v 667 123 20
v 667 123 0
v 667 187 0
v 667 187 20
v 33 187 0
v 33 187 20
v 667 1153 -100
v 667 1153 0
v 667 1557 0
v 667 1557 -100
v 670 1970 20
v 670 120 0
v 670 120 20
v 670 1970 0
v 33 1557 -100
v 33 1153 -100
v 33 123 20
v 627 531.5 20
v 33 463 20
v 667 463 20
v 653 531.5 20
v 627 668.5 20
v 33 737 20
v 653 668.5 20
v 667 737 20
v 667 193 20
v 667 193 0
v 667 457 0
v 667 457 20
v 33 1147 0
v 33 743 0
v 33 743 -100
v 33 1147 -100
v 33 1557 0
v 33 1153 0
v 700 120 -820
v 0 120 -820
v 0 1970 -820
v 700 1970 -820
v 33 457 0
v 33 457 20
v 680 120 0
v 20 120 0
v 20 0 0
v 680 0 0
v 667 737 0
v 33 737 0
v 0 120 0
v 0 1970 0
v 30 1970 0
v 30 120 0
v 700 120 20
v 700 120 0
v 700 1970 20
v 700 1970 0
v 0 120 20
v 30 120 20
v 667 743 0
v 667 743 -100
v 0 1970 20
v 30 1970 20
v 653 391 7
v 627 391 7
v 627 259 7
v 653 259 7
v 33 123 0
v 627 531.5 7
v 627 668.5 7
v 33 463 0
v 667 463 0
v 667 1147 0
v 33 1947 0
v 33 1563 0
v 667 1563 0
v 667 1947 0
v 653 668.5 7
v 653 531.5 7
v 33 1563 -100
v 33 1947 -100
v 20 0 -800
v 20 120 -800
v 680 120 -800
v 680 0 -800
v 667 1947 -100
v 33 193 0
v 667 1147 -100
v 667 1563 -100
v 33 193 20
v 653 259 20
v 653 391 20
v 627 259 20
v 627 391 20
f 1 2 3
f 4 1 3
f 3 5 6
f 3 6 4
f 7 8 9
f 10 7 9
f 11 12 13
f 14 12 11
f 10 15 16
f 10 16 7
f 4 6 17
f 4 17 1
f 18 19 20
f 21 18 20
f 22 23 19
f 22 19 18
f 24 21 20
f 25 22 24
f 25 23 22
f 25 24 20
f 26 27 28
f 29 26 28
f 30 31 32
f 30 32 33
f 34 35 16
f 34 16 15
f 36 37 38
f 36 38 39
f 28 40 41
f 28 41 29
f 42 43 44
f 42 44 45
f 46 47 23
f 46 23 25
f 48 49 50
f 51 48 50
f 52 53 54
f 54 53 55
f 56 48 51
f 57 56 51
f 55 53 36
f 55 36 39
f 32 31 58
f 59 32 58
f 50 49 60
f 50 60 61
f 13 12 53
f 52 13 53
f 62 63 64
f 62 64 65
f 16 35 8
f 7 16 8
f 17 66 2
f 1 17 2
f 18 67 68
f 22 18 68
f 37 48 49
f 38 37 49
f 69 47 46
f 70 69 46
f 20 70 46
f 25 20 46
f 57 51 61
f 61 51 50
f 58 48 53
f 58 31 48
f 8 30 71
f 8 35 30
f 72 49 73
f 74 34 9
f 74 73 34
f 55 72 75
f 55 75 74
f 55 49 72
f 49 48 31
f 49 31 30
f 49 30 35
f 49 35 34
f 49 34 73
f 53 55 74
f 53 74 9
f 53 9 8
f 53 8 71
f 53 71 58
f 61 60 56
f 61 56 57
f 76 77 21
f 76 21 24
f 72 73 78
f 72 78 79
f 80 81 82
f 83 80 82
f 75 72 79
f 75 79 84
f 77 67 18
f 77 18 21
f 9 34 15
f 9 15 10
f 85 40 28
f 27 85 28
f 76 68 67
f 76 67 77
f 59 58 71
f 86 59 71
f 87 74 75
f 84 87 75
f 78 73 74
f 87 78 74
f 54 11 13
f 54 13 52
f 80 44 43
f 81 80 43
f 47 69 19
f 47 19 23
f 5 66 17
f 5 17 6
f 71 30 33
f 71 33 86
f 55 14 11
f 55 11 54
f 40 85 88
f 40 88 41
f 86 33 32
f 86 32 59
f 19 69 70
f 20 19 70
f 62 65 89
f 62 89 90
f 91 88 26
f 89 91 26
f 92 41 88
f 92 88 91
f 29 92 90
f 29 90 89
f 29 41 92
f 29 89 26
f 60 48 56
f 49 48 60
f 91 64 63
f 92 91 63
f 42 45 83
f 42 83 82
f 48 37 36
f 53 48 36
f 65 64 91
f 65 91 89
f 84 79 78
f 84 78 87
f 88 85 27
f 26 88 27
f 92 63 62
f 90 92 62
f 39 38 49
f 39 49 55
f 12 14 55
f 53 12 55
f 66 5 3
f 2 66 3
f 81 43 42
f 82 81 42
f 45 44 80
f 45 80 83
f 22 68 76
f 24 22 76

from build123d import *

# Parameters (mm, degrees)
SKETCH1_W              = 700
SKETCH1_H              = 1850
GOVDE_KASA_DEPTH       = 820
SKETCH2_W              = 660
SKETCH2_H              = 120
PLINT_DEPTH            = 800
SKETCH3_W              = 30
SKETCH3_H              = 1850
SOVE_SOL_DEPTH         = 20
SKETCH4_W              = 30
SKETCH4_H              = 1850
SOVE_SAG_DEPTH         = 20
SKETCH5_W              = 634
SKETCH5_H              = 384
ACIKLIK_KAT1_DEPTH     = 100
SKETCH6_W              = 634
SKETCH6_H              = 404
ACIKLIK_KAT2_DEPTH     = 100
SKETCH7_W              = 634
SKETCH7_H              = 404
ACIKLIK_KAT3_DEPTH     = 100
SKETCH8_W              = 634
SKETCH8_H              = 274
KLAPE_ALT_1_DEPTH      = 20
KLAPE_ALT_1_KULP_START = 7
SKETCH9_W              = 26
SKETCH9_H              = 137
KLAPE_ALT_1_KULP_DEPTH = 13
SKETCH10_W             = 634
SKETCH10_H             = 264
KLAPE_ALT_2_DEPTH      = 20
KLAPE_ALT_2_KULP_START = 7
SKETCH11_W             = 26
SKETCH11_H             = 132
KLAPE_ALT_2_KULP_DEPTH = 13
SKETCH12_W             = 634
SKETCH12_H             = 64
PANEL_ALT_DEPTH        = 20


with BuildPart() as part:
    # Sketch1 → govde_kasa (new body)
    with BuildSketch(Plane.XY):
        with Locations((350, 1045)):
            Rectangle(SKETCH1_W, SKETCH1_H)
    extrude(amount=-GOVDE_KASA_DEPTH)

    # Sketch5 → aciklik_kat1 (cut)
    with BuildSketch(Plane.XY):
        with Locations((350, 1755)):
            Rectangle(SKETCH5_W, SKETCH5_H)
    extrude(amount=-ACIKLIK_KAT1_DEPTH, mode=Mode.SUBTRACT)

    # Sketch6 → aciklik_kat2 (cut)
    with BuildSketch(Plane.XY):
        with Locations((350, 1355)):
            Rectangle(SKETCH6_W, SKETCH6_H)
    extrude(amount=-ACIKLIK_KAT2_DEPTH, mode=Mode.SUBTRACT)

    # Sketch7 → aciklik_kat3 (cut)
    with BuildSketch(Plane.XY):
        with Locations((350, 945)):
            Rectangle(SKETCH7_W, SKETCH7_H)
    extrude(amount=-ACIKLIK_KAT3_DEPTH, mode=Mode.SUBTRACT)


with BuildPart() as body_2:
    # Sketch2 → plint (new body)
    with BuildSketch(Plane.XY):
        with Locations((350, 60)):
            Rectangle(SKETCH2_W, SKETCH2_H)
    extrude(amount=-PLINT_DEPTH)


with BuildPart() as body_3:
    # Sketch3 → sove_sol (new body)
    with BuildSketch(Plane.XY):
        with Locations((15, 1045)):
            Rectangle(SKETCH3_W, SKETCH3_H)
    extrude(amount=SOVE_SOL_DEPTH)


with BuildPart() as body_4:
    # Sketch4 → sove_sag (new body)
    with BuildSketch(Plane.XY):
        with Locations((685, 1045)):
            Rectangle(SKETCH4_W, SKETCH4_H)
    extrude(amount=SOVE_SAG_DEPTH)


with BuildPart() as body_5:
    # Sketch8 → klape_alt_1 (new body)
    with BuildSketch(Plane.XY):
        with Locations((350, 600)):
            Rectangle(SKETCH8_W, SKETCH8_H)
    extrude(amount=KLAPE_ALT_1_DEPTH)

    # Sketch9 → klape_alt_1_kulp (cut)
    with BuildSketch(Plane.XY.offset(KLAPE_ALT_1_KULP_START)):
        with Locations((640, 600)):
            Rectangle(SKETCH9_W, SKETCH9_H)
    extrude(amount=KLAPE_ALT_1_KULP_DEPTH, mode=Mode.SUBTRACT)


with BuildPart() as body_6:
    # Sketch10 → klape_alt_2 (new body)
    with BuildSketch(Plane.XY):
        with Locations((350, 325)):
            Rectangle(SKETCH10_W, SKETCH10_H)
    extrude(amount=KLAPE_ALT_2_DEPTH)

    # Sketch11 → klape_alt_2_kulp (cut)
    with BuildSketch(Plane.XY.offset(KLAPE_ALT_2_KULP_START)):
        with Locations((640, 325)):
            Rectangle(SKETCH11_W, SKETCH11_H)
    extrude(amount=KLAPE_ALT_2_KULP_DEPTH, mode=Mode.SUBTRACT)


with BuildPart() as body_7:
    # Sketch12 → panel_alt (new body)
    with BuildSketch(Plane.XY):
        with Locations((350, 155)):
            Rectangle(SKETCH12_W, SKETCH12_H)
    extrude(amount=PANEL_ALT_DEPTH)


solid = Compound([part.part, body_2.part, body_3.part, body_4.part, body_5.part, body_6.part, body_7.part])
